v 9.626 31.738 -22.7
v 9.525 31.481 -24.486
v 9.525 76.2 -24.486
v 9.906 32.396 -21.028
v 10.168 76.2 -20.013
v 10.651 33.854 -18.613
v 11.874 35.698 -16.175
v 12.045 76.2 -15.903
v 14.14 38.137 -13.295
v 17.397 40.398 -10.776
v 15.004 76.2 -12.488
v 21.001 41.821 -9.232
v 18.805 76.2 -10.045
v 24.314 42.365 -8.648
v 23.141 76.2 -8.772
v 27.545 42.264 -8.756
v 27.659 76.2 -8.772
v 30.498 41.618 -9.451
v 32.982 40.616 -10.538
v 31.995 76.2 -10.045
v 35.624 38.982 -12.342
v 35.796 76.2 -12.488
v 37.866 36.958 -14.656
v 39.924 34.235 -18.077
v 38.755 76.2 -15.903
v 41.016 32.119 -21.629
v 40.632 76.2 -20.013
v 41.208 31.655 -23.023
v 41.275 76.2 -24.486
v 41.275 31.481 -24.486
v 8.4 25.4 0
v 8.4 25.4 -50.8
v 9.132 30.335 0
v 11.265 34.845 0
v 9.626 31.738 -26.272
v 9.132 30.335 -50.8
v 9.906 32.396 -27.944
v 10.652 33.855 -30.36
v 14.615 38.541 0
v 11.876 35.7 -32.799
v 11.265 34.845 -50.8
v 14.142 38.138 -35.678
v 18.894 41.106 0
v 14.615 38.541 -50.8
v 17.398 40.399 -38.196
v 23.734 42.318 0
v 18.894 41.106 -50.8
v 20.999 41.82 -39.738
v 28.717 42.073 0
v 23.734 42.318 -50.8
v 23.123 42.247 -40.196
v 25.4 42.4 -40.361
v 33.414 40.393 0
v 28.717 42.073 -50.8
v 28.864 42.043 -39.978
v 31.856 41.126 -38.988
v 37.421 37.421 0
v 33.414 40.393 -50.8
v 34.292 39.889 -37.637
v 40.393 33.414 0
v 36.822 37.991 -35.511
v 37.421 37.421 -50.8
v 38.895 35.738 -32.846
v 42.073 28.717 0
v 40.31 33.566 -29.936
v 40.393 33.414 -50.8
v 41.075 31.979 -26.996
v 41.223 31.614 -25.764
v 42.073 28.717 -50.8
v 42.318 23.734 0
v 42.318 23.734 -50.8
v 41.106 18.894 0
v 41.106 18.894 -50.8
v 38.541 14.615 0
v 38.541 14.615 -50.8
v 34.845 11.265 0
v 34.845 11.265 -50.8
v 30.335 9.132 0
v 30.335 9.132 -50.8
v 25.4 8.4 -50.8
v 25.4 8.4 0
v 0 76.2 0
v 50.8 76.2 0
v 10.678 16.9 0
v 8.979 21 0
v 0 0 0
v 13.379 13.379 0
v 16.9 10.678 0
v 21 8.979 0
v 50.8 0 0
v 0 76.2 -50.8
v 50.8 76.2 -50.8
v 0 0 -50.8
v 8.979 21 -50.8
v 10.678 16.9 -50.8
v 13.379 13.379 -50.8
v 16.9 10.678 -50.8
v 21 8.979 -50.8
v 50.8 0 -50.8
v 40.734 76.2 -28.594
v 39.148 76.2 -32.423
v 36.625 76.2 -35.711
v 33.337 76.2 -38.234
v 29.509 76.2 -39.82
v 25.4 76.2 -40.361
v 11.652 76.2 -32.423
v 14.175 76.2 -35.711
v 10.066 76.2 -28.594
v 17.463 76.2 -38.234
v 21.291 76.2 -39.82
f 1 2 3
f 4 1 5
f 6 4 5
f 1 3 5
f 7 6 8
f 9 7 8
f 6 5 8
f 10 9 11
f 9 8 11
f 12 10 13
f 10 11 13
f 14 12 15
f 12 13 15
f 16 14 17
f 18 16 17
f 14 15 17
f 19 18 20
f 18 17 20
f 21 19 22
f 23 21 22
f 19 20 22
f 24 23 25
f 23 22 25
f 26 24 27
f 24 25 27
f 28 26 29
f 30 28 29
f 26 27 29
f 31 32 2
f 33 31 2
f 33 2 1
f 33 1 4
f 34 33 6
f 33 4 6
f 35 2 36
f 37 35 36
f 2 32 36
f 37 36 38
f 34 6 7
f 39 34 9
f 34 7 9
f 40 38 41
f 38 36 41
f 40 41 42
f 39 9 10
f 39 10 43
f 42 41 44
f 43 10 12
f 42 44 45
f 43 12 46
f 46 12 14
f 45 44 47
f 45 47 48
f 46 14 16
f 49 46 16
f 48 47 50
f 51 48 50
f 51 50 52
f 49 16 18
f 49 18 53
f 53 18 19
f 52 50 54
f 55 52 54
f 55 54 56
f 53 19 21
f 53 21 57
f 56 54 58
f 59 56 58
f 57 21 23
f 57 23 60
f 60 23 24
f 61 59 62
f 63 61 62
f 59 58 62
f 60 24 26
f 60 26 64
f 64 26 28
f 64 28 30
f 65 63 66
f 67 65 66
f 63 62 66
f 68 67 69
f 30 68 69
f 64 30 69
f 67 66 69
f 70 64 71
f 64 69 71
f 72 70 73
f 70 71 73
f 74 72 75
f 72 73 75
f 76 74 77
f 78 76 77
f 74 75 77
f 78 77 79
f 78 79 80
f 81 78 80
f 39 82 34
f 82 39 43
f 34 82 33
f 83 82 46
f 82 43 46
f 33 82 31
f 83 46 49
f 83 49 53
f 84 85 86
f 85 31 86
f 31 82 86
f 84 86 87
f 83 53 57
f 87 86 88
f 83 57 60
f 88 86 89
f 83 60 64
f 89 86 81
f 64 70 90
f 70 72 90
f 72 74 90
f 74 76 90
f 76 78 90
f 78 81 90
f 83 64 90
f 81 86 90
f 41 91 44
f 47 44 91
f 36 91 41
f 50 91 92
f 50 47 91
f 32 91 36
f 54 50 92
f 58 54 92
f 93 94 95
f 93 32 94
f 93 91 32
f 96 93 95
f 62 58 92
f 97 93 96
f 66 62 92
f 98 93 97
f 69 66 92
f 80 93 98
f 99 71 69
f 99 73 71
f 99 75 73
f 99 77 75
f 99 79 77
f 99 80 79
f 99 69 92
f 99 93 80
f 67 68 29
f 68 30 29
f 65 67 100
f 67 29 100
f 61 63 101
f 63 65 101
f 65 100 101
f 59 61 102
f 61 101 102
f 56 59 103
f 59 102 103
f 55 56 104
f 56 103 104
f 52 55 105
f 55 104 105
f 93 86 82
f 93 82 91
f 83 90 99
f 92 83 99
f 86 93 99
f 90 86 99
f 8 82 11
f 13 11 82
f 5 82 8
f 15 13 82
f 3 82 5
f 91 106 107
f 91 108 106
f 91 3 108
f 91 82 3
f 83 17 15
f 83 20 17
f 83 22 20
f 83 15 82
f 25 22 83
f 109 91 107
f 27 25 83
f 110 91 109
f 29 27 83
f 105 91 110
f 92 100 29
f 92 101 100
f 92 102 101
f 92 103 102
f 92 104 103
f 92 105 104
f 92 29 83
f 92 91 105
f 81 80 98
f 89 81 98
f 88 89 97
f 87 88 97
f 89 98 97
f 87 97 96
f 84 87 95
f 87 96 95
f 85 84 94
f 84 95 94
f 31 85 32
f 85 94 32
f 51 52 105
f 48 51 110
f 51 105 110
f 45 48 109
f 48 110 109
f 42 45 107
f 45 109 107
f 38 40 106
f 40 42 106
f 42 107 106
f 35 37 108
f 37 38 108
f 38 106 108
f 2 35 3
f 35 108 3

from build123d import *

# Parameters (mm, degrees)
SKETCH1_W               = 50.8
SKETCH1_H               = 50.8
BOSS_EXTRUDE1_DEPTH     = 76.2
CUT_EXTRUDE1_DEPTH      = 76.2
CUT_EXTRUDE2_REACH      = 106.727
CUT_EXTRUDE2_END_RADIUS = 17


with BuildPart() as part:
    # Sketch1 → Boss-Extrude1 (new body)
    with BuildSketch(Plane(origin=(0, 0, 0), x_dir=(1, 0, 0), z_dir=(0, 1, 0))):
        with Locations((25.4, 25.4)):
            Rectangle(SKETCH1_W, SKETCH1_H)
    extrude(amount=BOSS_EXTRUDE1_DEPTH)

    # Sketch2 → Cut-Extrude1 (cut)
    with BuildSketch(Plane(origin=(0, 0, -50.8), x_dir=(-1, 0, 0), z_dir=(0, 0, -1))):
        with BuildLine():
            ThreePointArc((-8.4, 25.4), (-37.42081528, 37.42081528), (-25.4, 8.4))
            Line((-25.4, 8.4), (-25.4, 25.4))
            Line((-25.4, 25.4), (-8.4, 25.4))
        make_face()
        with BuildLine():
            Line((-25.4, 25.4), (-25.4, 8.4))
            ThreePointArc((-25.4, 8.4), (-13.37918472, 13.37918472), (-8.4, 25.4))
            Line((-8.4, 25.4), (-25.4, 25.4))
        make_face()
    extrude(amount=-CUT_EXTRUDE1_DEPTH, mode=Mode.SUBTRACT)

    # Cut-Extrude2: up to this cylinder (the profile starts outside it)
    cut_extrude2_end = Plane(origin=(25.4, 25.4, -26.731477), z_dir=(0, 0, -1)) * Cylinder(CUT_EXTRUDE2_END_RADIUS, 257.437412, mode=Mode.PRIVATE)
    # Sketch3 → Cut-Extrude2 (cut, up to the surface)
    with BuildSketch(Plane(origin=(0, 76.2, 0), x_dir=(1, 0, 0), z_dir=(0, 1, 0)), mode=Mode.PRIVATE) as cut_extrude2_sk1:
        with BuildLine():
            ThreePointArc((41.275, 24.485623633), (36.625320151, 35.710943784), (25.4, 40.360623633))
            Line((25.4, 40.360623633), (25.4, 24.485623633))
            Line((25.4, 24.485623633), (9.525, 24.485623633))
            ThreePointArc((9.525, 24.485623633), (25.4, 8.610623633), (41.275, 24.485623633))
        make_face()
    cut_extrude2_tool1 = extrude(cut_extrude2_sk1.sketch, amount=-CUT_EXTRUDE2_REACH, mode=Mode.PRIVATE) - cut_extrude2_end
    add(cut_extrude2_tool1.solids().sort_by_distance((27.645853, 76.2, -22.239771))[0], mode=Mode.SUBTRACT)
    # Sketch3 → Cut-Extrude2 (cut, up to the surface)
    with BuildSketch(Plane(origin=(0, 76.2, 0), x_dir=(1, 0, 0), z_dir=(0, 1, 0)), mode=Mode.PRIVATE) as cut_extrude2_sk2:
        with BuildLine():
            Line((25.4, 24.485623633), (25.4, 40.360623633))
            ThreePointArc((25.4, 40.360623633), (14.174679849, 35.710943784), (9.525, 24.485623633))
            Line((9.525, 24.485623633), (25.4, 24.485623633))
        make_face()
    cut_extrude2_tool2 = extrude(cut_extrude2_sk2.sketch, amount=-CUT_EXTRUDE2_REACH, mode=Mode.PRIVATE) - cut_extrude2_end
    add(cut_extrude2_tool2.solids().sort_by_distance((18.662441, 76.2, -31.223183))[0], mode=Mode.SUBTRACT)
    # Sketch3 → Cut-Extrude2 (cut, up to the surface)
    with BuildSketch(Plane(origin=(0, 76.2, 0), x_dir=(1, 0, 0), z_dir=(0, 1, 0)), mode=Mode.PRIVATE) as cut_extrude2_sk3:
        with BuildLine():
            ThreePointArc((41.275, 24.485623633), (36.625320151, 35.710943784), (25.4, 40.360623633))
            Line((25.4, 40.360623633), (25.4, 24.485623633))
            Line((25.4, 24.485623633), (9.525, 24.485623633))
            ThreePointArc((9.525, 24.485623633), (25.4, 8.610623633), (41.275, 24.485623633))
        make_face()
    cut_extrude2_tool3 = extrude(cut_extrude2_sk3.sketch, amount=-CUT_EXTRUDE2_REACH, mode=Mode.PRIVATE) - cut_extrude2_end
    add(cut_extrude2_tool3.solids().sort_by_distance((27.645853, 76.2, -22.239771))[0], mode=Mode.SUBTRACT)
    # Sketch3 → Cut-Extrude2 (cut, up to the surface)
    with BuildSketch(Plane(origin=(0, 76.2, 0), x_dir=(1, 0, 0), z_dir=(0, 1, 0)), mode=Mode.PRIVATE) as cut_extrude2_sk4:
        with BuildLine():
            Line((25.4, 24.485623633), (25.4, 40.360623633))
            ThreePointArc((25.4, 40.360623633), (14.174679849, 35.710943784), (9.525, 24.485623633))
            Line((9.525, 24.485623633), (25.4, 24.485623633))
        make_face()
    cut_extrude2_tool4 = extrude(cut_extrude2_sk4.sketch, amount=-CUT_EXTRUDE2_REACH, mode=Mode.PRIVATE) - cut_extrude2_end
    add(cut_extrude2_tool4.solids().sort_by_distance((18.662441, 76.2, -31.223183))[0], mode=Mode.SUBTRACT)


solid = part.part
